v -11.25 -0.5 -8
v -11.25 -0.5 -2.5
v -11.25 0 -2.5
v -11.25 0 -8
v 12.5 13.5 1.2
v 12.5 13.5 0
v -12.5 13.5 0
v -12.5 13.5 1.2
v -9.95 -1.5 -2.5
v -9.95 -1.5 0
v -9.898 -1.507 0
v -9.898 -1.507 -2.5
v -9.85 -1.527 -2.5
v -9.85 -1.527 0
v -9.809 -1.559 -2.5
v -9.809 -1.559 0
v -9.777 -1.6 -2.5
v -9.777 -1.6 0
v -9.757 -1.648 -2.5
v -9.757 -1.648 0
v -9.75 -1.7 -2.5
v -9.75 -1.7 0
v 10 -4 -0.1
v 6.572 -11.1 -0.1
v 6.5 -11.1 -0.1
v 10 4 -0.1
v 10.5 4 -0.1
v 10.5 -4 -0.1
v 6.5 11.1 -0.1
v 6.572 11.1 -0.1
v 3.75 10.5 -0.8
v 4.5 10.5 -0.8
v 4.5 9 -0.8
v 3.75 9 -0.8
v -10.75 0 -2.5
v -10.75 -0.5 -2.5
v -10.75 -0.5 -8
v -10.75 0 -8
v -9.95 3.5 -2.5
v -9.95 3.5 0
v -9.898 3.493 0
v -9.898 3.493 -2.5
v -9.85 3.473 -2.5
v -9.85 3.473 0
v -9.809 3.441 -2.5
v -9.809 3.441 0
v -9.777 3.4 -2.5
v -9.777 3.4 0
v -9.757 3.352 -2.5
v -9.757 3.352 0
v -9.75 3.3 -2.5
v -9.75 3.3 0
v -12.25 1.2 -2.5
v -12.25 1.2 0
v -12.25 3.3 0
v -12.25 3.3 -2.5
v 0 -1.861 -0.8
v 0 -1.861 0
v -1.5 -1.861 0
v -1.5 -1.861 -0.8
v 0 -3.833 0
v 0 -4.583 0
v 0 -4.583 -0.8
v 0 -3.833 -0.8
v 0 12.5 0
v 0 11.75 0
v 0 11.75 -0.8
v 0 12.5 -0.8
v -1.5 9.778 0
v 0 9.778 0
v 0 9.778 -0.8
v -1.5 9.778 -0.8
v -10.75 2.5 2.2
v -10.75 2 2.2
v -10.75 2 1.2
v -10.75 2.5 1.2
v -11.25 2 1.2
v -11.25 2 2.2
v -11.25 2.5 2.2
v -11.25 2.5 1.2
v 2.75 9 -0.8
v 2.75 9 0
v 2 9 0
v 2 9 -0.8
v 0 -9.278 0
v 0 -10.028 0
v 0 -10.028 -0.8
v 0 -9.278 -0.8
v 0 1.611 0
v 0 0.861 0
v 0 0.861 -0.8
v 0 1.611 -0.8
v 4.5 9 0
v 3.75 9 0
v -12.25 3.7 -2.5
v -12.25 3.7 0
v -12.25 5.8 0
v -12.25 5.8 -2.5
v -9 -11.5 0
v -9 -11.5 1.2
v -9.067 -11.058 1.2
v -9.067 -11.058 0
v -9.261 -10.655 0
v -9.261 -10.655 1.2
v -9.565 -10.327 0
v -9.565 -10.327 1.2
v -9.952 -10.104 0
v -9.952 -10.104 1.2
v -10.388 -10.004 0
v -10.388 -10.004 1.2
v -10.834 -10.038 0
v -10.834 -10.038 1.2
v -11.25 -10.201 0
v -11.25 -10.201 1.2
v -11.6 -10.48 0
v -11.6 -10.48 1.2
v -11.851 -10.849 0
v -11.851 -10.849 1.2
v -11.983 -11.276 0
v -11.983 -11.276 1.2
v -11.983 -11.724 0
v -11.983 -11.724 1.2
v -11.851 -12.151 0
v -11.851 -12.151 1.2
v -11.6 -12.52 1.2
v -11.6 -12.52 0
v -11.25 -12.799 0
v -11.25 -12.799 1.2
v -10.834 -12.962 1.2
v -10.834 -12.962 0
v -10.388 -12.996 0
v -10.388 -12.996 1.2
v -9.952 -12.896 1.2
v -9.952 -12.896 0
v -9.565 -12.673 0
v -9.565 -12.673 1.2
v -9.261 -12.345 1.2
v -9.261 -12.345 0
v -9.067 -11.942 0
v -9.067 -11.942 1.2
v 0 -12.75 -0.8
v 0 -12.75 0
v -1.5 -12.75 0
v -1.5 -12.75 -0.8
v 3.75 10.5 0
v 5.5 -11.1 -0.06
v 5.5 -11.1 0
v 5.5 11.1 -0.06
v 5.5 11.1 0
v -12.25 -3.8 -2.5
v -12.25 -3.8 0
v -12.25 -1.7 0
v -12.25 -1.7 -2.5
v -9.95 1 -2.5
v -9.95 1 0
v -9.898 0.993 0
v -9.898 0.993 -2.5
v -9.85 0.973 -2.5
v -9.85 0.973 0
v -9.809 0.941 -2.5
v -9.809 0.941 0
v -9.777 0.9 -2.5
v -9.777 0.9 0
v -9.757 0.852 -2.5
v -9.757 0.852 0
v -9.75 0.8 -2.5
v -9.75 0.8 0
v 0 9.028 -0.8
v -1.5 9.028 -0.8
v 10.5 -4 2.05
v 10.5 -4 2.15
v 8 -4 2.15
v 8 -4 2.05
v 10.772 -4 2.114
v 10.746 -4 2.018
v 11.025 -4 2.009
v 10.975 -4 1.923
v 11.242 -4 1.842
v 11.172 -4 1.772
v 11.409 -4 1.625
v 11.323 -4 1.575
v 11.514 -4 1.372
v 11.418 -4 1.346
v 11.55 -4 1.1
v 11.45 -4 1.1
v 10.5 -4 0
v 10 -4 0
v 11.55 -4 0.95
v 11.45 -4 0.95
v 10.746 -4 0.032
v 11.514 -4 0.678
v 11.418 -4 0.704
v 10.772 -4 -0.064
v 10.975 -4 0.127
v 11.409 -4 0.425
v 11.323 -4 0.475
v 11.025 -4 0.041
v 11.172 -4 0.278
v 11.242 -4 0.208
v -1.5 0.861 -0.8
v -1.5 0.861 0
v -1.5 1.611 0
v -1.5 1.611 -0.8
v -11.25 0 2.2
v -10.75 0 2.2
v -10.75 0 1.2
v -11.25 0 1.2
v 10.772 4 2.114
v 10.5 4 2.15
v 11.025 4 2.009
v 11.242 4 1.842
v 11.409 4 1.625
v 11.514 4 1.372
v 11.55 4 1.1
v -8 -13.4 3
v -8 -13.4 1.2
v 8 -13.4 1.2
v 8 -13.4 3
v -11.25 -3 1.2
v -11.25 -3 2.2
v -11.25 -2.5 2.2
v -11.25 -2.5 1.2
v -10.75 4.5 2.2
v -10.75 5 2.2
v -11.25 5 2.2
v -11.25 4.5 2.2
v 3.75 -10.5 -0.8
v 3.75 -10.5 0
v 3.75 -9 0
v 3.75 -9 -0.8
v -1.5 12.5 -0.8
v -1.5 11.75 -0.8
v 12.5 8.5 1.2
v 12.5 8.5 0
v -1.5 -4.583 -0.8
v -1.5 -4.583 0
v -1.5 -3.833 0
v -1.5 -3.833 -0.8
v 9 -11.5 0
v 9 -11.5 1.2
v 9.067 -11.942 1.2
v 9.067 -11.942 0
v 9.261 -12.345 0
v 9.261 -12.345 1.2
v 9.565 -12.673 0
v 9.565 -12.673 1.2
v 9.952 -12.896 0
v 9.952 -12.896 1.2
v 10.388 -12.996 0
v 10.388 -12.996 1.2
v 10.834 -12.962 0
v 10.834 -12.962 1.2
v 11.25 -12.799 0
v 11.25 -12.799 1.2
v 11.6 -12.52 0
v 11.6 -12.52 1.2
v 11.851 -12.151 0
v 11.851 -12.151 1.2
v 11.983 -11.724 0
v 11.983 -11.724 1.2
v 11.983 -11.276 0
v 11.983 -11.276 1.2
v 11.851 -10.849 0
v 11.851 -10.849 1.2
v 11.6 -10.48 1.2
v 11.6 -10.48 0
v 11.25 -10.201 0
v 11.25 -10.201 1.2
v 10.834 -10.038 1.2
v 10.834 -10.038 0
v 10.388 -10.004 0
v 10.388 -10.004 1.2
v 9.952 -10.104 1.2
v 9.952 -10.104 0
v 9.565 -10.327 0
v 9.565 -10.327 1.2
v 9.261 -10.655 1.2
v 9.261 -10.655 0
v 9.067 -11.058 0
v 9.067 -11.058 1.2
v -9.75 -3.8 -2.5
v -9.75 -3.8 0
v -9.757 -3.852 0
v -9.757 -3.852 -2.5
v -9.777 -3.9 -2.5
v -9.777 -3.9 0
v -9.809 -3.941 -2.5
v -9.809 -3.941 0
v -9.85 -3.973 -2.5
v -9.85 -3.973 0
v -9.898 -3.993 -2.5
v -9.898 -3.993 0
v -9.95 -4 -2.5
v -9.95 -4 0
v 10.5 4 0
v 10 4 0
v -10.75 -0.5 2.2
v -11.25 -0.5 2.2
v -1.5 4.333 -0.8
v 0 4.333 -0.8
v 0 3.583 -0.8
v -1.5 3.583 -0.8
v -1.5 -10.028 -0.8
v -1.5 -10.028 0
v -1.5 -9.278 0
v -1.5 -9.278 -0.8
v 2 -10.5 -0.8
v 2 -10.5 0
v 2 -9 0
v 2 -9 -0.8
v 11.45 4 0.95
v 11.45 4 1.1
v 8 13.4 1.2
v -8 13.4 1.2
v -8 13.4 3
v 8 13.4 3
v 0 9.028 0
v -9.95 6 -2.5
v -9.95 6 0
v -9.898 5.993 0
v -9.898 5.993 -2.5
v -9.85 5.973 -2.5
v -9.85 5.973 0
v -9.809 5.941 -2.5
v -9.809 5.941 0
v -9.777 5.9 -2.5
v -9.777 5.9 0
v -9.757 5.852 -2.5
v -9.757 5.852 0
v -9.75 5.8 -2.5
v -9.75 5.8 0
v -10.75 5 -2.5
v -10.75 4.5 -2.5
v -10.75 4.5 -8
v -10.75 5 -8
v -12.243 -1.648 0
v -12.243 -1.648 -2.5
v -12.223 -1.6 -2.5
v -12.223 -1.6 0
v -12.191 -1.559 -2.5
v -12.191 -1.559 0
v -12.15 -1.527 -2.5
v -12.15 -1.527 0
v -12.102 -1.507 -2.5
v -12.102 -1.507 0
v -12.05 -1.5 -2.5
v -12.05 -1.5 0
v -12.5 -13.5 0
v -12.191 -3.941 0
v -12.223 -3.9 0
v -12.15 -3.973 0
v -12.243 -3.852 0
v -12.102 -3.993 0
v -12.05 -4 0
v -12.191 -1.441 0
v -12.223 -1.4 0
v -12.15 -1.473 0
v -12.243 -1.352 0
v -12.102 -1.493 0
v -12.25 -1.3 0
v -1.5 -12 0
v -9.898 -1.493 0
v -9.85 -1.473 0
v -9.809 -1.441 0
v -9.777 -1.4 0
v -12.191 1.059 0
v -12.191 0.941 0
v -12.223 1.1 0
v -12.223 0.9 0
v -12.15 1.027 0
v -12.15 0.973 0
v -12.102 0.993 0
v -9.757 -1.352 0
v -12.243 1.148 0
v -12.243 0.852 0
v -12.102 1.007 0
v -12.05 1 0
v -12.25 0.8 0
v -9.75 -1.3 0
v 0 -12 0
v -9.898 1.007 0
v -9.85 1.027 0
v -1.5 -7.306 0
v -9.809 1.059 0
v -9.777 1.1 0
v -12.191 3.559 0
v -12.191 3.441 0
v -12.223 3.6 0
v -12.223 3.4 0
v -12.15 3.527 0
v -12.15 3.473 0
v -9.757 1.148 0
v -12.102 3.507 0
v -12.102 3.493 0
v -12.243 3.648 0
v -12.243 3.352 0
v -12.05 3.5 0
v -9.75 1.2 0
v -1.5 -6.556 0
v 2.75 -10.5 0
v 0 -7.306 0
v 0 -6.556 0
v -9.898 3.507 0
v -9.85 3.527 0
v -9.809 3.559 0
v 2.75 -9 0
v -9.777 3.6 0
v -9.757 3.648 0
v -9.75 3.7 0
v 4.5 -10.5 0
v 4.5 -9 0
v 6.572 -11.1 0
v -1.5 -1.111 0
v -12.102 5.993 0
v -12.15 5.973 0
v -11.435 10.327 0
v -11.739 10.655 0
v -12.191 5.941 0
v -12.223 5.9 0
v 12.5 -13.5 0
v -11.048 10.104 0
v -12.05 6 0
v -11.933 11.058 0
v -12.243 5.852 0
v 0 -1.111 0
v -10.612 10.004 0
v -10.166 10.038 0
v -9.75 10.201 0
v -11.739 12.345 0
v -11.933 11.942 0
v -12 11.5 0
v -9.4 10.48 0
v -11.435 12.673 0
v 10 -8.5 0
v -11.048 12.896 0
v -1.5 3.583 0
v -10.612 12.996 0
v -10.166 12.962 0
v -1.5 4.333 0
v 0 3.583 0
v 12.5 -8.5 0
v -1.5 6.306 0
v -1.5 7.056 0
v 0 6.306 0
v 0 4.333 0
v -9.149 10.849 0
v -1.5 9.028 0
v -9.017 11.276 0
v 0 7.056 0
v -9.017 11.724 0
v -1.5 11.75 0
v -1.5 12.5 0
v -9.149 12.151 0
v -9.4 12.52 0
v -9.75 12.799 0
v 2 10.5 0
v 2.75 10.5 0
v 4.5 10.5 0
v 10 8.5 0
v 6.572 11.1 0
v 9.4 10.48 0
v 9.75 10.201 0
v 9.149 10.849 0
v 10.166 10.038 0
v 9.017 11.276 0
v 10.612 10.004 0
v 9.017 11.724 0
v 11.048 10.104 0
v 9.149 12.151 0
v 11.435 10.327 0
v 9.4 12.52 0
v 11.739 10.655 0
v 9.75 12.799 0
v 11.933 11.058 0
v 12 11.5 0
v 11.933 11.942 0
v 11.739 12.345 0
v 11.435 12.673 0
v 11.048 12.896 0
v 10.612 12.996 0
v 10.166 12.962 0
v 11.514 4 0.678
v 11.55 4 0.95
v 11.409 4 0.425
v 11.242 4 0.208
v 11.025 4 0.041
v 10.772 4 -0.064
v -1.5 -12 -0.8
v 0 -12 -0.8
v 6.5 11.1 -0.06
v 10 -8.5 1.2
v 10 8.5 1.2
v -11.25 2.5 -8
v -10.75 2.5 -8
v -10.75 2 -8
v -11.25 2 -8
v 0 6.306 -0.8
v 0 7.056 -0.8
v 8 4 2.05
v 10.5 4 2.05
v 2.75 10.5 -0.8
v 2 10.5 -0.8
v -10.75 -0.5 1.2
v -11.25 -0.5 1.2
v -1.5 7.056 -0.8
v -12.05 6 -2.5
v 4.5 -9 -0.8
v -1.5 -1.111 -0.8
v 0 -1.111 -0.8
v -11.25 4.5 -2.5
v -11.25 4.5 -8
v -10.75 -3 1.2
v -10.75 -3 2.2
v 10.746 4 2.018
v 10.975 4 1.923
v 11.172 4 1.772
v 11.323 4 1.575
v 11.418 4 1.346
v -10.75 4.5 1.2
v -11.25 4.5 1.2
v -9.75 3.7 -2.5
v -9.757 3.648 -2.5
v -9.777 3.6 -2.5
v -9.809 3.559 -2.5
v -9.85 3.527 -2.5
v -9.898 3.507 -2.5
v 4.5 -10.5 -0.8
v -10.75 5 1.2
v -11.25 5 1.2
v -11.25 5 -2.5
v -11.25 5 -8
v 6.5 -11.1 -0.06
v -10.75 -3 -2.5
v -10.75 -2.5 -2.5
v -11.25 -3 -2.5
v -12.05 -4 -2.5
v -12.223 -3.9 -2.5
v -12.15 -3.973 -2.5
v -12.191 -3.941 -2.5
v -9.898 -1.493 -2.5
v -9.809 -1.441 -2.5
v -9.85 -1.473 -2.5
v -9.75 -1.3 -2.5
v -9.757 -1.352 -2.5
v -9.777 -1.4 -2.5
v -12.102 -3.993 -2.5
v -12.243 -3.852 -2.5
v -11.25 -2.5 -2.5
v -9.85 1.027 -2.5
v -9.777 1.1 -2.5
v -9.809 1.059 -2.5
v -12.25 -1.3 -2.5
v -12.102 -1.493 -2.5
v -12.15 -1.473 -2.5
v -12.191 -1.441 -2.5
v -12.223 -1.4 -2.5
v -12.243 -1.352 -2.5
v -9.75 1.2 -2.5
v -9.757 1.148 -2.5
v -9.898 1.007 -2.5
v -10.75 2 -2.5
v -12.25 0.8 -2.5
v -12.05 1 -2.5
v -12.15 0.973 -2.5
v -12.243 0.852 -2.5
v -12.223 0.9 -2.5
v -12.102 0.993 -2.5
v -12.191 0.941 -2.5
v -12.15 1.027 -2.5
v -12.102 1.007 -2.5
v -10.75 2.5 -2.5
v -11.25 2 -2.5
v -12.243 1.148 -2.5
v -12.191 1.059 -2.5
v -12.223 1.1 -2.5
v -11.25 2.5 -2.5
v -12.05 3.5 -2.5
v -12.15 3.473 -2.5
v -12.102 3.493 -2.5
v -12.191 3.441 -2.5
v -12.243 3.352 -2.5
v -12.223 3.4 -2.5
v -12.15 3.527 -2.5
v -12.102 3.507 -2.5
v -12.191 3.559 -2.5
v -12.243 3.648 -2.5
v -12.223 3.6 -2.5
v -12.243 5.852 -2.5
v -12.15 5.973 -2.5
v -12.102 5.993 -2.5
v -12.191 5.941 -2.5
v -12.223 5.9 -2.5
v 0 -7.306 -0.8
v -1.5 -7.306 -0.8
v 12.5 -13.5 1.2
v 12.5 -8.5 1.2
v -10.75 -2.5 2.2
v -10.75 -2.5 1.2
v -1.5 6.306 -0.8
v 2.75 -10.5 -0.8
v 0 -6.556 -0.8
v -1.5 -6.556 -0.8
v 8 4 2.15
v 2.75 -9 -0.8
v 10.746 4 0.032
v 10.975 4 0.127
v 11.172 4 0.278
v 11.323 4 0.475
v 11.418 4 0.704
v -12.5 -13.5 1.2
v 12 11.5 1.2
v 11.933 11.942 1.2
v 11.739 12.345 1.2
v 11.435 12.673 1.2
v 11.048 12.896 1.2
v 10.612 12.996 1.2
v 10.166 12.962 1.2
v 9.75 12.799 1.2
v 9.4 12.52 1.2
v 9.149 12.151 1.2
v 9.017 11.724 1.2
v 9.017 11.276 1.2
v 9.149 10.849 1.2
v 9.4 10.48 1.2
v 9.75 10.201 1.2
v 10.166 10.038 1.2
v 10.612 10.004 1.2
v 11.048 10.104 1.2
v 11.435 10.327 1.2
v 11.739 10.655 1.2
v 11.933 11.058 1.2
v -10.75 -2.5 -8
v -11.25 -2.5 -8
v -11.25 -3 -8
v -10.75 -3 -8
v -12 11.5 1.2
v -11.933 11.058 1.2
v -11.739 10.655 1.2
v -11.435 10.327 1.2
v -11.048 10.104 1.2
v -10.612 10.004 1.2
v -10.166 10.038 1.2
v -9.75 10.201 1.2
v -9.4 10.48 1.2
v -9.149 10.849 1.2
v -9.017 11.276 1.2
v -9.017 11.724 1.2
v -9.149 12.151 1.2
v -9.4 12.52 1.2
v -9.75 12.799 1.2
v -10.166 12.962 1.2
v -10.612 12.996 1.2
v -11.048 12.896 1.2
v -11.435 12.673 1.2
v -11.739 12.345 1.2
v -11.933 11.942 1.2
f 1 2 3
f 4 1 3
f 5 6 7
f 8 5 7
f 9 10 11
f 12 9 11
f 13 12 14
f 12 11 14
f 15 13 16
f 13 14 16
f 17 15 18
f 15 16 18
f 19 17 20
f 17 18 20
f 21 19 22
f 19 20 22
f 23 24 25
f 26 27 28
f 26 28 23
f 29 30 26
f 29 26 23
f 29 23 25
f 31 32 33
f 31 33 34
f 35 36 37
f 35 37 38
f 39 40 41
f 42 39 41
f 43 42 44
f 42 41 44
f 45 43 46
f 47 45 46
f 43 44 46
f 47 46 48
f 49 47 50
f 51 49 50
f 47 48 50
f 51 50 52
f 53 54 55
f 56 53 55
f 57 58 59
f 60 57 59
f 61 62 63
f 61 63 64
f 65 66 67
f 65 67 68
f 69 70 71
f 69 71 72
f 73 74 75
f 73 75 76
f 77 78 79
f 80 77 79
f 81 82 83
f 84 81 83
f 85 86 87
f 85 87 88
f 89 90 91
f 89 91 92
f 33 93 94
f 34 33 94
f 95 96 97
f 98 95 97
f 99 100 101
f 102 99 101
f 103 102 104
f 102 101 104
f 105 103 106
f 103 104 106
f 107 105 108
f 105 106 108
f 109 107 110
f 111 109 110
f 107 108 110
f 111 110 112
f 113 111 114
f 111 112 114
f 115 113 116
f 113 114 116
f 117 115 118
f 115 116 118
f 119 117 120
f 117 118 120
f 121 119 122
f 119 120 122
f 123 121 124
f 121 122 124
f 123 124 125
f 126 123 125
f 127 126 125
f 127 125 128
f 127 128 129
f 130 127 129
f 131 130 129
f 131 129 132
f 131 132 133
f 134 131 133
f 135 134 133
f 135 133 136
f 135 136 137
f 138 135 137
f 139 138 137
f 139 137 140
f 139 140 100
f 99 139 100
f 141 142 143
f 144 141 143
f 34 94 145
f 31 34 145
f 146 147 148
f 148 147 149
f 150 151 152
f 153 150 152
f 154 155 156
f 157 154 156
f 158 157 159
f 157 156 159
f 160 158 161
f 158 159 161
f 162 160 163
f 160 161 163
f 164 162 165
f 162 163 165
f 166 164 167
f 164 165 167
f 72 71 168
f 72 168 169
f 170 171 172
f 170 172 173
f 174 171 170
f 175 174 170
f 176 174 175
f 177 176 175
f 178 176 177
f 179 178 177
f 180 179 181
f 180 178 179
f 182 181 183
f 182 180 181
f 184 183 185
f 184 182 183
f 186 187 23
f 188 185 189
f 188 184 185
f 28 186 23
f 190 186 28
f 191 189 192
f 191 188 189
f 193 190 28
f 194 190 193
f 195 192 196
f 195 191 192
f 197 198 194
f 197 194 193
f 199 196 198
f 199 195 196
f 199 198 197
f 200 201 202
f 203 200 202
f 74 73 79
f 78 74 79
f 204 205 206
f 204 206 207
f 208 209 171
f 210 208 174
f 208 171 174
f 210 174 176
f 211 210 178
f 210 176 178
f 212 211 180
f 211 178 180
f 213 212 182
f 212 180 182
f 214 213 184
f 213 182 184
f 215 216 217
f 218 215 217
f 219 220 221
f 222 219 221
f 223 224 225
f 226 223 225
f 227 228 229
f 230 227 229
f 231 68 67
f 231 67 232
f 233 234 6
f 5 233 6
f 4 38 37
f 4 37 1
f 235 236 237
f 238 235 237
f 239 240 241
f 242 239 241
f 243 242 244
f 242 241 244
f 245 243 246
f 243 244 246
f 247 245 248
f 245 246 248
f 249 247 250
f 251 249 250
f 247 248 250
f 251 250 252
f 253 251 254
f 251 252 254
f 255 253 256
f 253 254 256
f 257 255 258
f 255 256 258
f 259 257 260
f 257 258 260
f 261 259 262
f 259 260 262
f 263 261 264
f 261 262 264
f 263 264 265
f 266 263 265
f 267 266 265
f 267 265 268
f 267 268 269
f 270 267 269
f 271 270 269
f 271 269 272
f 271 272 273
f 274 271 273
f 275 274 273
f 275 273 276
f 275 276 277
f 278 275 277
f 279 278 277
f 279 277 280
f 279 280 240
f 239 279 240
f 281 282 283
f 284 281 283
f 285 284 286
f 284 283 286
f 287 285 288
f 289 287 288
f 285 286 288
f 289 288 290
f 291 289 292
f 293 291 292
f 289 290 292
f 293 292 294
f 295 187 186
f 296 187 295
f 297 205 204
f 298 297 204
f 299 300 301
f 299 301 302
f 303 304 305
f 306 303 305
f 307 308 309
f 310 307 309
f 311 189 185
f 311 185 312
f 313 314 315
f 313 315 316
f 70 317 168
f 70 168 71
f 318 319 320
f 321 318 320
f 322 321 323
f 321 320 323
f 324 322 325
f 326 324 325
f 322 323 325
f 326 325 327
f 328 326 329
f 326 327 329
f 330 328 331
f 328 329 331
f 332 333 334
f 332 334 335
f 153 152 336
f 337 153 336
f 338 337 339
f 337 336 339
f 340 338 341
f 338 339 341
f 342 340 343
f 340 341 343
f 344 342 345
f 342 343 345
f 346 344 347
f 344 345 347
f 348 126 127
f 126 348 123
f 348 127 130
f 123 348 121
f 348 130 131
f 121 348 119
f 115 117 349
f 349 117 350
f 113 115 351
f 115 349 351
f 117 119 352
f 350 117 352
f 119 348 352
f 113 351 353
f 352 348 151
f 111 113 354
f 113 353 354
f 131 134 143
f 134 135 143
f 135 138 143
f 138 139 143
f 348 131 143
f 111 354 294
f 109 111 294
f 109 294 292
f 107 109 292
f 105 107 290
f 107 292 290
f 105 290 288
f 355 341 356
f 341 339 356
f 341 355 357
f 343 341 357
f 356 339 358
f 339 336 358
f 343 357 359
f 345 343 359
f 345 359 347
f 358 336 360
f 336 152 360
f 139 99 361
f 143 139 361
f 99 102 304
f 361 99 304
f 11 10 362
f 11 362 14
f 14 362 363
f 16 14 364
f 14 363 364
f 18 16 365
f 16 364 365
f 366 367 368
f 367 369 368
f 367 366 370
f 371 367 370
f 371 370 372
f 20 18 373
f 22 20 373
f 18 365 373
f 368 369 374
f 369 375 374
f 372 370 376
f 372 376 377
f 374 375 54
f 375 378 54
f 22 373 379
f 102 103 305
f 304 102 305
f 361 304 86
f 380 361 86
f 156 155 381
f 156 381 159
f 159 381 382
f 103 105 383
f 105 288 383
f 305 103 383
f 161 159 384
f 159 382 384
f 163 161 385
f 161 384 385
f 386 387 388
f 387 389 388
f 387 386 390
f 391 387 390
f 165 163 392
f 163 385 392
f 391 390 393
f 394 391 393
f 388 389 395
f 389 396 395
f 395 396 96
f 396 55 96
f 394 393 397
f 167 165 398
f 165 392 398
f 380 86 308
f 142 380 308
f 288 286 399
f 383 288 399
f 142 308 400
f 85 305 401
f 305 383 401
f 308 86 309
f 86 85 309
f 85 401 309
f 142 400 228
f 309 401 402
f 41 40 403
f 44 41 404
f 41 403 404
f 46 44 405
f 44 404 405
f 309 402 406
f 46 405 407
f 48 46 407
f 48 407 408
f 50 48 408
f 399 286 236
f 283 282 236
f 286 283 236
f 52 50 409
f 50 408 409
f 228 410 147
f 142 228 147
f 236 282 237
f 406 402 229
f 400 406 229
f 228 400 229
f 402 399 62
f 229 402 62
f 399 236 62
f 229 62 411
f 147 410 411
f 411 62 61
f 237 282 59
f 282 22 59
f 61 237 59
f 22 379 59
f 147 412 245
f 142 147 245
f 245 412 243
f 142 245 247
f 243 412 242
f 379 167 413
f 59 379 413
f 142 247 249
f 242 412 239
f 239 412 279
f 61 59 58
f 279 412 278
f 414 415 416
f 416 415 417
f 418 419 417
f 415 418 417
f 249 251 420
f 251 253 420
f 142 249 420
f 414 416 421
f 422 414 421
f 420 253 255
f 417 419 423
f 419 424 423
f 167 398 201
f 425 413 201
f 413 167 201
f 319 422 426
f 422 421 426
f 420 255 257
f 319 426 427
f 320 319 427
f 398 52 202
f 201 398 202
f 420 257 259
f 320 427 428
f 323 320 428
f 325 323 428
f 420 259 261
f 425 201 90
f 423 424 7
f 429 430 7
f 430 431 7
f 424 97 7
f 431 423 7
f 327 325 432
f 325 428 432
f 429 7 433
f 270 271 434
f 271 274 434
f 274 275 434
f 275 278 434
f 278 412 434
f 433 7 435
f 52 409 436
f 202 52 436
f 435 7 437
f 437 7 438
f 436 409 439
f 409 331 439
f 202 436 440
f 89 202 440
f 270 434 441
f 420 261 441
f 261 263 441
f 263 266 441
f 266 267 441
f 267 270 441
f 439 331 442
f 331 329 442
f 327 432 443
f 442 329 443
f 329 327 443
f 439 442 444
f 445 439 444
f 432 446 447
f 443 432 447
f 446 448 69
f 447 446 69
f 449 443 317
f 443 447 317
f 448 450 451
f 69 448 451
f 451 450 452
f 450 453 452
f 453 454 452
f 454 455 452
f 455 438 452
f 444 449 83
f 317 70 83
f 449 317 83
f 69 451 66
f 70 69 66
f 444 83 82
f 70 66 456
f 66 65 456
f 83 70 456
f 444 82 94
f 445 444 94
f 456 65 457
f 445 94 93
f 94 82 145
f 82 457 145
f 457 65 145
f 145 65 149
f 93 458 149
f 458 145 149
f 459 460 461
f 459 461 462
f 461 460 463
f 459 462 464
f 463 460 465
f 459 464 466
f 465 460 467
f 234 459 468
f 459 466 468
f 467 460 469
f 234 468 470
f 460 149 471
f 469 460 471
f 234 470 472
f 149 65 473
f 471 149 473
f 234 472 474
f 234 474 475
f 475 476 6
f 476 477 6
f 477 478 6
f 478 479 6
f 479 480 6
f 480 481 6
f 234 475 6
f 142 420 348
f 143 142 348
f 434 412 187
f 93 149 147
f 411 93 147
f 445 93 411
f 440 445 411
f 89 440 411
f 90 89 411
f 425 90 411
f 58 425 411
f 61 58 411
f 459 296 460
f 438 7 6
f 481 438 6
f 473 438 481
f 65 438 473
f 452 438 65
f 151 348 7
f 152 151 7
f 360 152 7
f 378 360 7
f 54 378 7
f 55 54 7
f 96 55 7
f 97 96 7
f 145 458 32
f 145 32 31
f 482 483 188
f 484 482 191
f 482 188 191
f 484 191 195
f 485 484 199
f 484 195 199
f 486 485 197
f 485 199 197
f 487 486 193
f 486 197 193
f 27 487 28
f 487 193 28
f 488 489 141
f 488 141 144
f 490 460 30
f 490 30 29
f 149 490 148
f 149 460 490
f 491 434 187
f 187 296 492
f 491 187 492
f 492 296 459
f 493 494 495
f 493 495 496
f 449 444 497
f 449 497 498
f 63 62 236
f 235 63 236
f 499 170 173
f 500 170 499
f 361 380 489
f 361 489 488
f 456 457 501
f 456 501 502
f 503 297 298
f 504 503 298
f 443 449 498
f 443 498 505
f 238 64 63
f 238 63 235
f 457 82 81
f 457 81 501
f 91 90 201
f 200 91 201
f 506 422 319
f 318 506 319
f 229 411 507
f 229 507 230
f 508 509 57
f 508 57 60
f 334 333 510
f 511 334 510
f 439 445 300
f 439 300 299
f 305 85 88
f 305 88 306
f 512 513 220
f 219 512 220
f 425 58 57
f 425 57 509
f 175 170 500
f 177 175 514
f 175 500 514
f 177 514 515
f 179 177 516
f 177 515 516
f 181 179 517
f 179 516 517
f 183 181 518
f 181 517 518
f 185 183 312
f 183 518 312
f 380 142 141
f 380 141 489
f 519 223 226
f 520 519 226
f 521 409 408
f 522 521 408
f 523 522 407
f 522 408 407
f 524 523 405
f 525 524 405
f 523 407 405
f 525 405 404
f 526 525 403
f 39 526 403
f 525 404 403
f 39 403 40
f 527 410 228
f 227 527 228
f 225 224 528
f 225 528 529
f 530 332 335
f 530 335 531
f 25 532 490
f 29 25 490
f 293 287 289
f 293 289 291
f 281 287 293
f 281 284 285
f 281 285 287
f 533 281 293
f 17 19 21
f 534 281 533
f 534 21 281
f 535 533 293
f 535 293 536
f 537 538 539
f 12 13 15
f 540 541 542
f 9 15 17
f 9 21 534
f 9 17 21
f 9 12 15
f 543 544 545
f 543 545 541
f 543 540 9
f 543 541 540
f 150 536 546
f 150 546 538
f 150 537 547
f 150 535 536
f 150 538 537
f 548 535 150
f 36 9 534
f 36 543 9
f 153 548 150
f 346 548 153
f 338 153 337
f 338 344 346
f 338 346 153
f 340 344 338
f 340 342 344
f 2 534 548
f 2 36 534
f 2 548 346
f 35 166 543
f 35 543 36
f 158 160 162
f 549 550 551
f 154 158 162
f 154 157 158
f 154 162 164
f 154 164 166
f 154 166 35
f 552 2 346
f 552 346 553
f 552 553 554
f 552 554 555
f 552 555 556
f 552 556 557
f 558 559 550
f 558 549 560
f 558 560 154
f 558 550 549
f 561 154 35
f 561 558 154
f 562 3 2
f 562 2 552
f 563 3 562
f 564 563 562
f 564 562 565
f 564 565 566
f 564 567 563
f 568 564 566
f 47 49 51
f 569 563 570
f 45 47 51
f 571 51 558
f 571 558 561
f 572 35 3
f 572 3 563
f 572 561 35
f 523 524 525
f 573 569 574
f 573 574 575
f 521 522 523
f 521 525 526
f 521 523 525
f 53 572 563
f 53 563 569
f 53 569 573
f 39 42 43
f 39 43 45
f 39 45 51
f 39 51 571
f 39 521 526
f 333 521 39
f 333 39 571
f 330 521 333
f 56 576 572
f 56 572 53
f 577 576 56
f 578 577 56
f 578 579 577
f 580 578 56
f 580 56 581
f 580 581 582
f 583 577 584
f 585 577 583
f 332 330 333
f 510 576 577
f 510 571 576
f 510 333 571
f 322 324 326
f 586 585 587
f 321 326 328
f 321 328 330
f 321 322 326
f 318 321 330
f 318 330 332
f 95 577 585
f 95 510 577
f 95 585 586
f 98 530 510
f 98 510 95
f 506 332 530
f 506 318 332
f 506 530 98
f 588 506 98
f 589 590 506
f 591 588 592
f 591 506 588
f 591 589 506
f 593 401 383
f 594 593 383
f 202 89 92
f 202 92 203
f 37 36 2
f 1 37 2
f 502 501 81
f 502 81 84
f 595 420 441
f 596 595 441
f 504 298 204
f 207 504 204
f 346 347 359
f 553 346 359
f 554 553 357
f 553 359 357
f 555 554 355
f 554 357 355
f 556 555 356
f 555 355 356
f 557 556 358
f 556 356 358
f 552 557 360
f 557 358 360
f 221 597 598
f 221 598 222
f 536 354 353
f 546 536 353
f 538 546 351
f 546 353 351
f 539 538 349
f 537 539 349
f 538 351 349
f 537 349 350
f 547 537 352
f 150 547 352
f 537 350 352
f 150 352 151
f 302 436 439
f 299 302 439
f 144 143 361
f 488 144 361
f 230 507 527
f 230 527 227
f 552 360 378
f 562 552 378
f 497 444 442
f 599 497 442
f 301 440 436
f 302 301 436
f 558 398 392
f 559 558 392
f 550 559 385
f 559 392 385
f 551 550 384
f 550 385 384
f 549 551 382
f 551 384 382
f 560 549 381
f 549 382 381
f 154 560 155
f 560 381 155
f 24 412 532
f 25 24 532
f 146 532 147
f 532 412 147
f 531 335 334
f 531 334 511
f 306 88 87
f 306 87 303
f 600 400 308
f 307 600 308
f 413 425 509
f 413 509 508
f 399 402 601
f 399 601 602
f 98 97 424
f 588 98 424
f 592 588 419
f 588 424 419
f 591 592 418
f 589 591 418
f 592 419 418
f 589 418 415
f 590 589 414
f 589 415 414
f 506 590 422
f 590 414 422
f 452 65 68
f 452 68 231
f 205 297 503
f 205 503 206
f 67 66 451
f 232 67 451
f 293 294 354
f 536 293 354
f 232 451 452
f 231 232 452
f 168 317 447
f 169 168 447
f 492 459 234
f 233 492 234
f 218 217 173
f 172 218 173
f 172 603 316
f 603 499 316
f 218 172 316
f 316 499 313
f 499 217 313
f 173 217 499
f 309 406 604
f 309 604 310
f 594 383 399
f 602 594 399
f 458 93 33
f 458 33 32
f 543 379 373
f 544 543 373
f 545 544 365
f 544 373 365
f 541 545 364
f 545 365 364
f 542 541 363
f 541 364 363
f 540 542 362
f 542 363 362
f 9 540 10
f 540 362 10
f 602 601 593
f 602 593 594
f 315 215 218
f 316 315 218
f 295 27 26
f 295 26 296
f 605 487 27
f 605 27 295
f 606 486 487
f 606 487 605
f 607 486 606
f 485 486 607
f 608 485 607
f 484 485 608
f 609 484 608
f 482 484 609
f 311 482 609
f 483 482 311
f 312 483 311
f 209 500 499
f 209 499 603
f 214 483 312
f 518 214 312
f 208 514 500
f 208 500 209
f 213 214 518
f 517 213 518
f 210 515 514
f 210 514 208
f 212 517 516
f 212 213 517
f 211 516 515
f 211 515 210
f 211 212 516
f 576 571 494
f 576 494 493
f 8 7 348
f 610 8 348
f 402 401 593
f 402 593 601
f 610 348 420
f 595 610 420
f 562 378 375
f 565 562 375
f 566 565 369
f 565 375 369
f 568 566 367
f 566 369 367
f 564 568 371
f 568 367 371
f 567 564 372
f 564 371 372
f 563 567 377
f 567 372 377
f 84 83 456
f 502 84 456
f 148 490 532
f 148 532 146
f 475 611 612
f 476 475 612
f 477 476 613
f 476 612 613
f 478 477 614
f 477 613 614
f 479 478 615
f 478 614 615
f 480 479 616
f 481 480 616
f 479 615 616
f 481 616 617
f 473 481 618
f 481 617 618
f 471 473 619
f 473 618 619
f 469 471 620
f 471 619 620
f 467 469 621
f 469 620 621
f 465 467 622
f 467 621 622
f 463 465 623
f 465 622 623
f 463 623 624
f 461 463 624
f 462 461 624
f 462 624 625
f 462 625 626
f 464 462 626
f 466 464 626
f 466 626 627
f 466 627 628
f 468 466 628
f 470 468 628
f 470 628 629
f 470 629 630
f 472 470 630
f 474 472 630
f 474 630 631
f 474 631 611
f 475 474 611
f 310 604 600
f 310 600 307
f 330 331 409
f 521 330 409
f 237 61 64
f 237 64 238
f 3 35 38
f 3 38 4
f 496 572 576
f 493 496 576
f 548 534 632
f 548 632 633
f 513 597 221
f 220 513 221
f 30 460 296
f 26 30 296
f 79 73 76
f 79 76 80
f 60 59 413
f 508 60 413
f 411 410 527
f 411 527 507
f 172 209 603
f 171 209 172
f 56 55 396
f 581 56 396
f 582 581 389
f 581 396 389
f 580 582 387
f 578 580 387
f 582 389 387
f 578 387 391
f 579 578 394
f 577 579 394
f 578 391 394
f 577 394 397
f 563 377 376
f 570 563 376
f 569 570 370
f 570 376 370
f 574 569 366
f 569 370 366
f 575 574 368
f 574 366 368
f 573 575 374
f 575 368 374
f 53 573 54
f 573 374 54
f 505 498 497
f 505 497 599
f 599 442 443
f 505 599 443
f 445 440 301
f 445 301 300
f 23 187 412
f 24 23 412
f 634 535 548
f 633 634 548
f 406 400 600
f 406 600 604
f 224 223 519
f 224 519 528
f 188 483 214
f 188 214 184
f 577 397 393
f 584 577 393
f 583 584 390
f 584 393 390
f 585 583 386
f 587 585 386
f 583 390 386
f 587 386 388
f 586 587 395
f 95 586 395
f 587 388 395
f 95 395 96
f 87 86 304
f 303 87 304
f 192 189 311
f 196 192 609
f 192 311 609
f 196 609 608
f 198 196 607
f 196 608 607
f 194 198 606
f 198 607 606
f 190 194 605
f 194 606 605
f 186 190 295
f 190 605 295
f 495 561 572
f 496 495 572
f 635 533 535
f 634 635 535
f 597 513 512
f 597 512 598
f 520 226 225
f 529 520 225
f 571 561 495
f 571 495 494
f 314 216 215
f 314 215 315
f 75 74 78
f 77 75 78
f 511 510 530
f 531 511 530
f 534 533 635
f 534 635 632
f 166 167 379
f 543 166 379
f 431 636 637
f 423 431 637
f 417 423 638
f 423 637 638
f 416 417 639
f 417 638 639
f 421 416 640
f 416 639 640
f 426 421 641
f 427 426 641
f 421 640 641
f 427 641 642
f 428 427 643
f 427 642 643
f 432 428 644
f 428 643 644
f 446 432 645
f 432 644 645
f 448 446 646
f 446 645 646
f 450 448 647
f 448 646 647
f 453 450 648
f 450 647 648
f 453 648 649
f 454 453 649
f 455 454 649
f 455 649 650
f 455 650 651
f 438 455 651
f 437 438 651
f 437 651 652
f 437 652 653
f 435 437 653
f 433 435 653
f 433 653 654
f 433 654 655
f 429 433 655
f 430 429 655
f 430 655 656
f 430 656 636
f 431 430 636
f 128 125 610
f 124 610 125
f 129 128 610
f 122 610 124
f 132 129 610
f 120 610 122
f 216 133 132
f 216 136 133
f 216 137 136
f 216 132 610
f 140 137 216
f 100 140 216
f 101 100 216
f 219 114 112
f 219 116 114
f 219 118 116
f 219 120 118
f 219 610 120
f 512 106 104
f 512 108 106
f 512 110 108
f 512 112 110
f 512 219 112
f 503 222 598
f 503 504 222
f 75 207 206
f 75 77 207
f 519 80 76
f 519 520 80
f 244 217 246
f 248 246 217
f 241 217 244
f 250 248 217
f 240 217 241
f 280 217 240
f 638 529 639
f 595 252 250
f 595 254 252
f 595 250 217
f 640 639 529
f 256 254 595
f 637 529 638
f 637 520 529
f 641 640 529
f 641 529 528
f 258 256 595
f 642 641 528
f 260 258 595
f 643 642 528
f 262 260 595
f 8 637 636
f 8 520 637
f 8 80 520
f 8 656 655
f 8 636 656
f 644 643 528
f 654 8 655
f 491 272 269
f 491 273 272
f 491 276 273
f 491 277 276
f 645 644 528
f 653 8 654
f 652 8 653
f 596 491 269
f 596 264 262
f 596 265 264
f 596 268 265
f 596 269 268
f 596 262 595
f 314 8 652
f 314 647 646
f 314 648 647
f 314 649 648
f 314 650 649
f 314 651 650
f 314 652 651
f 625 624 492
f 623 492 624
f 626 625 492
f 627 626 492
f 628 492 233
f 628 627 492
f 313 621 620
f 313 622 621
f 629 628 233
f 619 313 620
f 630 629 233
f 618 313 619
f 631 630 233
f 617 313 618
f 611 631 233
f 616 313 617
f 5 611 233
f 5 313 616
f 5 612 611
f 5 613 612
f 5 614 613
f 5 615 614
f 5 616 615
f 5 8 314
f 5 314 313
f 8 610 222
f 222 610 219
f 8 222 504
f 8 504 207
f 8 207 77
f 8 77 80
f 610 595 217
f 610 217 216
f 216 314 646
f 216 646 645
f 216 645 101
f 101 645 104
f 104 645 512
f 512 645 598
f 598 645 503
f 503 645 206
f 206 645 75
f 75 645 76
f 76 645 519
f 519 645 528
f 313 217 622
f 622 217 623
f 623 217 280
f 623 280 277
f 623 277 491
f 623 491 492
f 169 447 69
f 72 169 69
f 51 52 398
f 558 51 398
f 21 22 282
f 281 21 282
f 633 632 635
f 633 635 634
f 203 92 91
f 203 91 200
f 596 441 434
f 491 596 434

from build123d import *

# Parameters (mm, degrees)
BOSS_EXTRUDE1_DEPTH      = 1.2
SKETCH2_R                = 1.5
CUT_EXTRUDE1_DEPTH       = 19.437461864
BOSS_EXTRUDE2_DEPTH      = 2.5
BOSS_EXTRUDE3_DEPTH      = 5.5
BOSS_EXTRUDE3_DEPTH_BACK = 4.7
SKETCH6_W                = 0.5
SKETCH6_H                = 0.5
SKETCH7_W                = 16
SKETCH7_H                = 26.8
BOSS_EXTRUDE4_DEPTH      = 1.8
SKETCH8_W                = 1.5
SKETCH8_H                = 0.75
SKETCH8_W_2              = 0.75
SKETCH8_H_2              = 1.5
BOSS_EXTRUDE5_DEPTH      = 0.8
SKETCH10_W               = 0.1
SKETCH10_H               = 8
BOSS_EXTRUDE6_DEPTH      = 0.1
SKETCH12_W               = 1
SKETCH12_H               = 22.2
BOSS_EXTRUDE7_DEPTH      = 0.06


with BuildPart() as part:
    # Sketch1 → Boss-Extrude1 (new body)
    with BuildSketch(Plane.XY):
        Polygon((10, -8.5), (10, 8.5), (12.5, 8.5), (12.5, 13.5), (-12.5, 13.5), (-12.5, -13.5), (12.5, -13.5), (12.5, -8.5), align=None)
    extrude(amount=BOSS_EXTRUDE1_DEPTH)

    # Sketch2 → Cut-Extrude1 (cut, through all)
    with BuildSketch(Plane.XY.offset(1.2)):
        with Locations((10.5, 11.5)):
            Circle(SKETCH2_R)
        with Locations(Location((10.5, -11.5, 0), (0, 0, 180))):
            Circle(SKETCH2_R)
        with Locations(Location((-10.5, 11.5, 0), (0, 0, 180))):
            Circle(SKETCH2_R)
        with Locations((-10.5, -11.5)):
            Circle(SKETCH2_R)
    extrude(amount=-CUT_EXTRUDE1_DEPTH, mode=Mode.SUBTRACT)

    # Sketch5 → Boss-Extrude2 (add)
    with BuildSketch(Plane(origin=(0, 0, 0), x_dir=(-1, 0, 0), z_dir=(0, 0, -1))):
        with BuildLine():
            Line((12.05, 6), (9.95, 6))
            ThreePointArc((9.95, 6), (9.808578644, 5.941421356), (9.75, 5.8))
            Line((9.75, 5.8), (9.75, 3.7))
            ThreePointArc((9.75, 3.7), (9.808578644, 3.558578644), (9.95, 3.5))
            ThreePointArc((9.95, 3.5), (9.808578644, 3.441421356), (9.75, 3.3))
            Line((9.75, 3.3), (9.75, 1.2))
            ThreePointArc((9.75, 1.2), (9.808578644, 1.058578644), (9.95, 1))
            ThreePointArc((9.95, 1), (9.808578644, 0.941421356), (9.75, 0.8))
            Line((9.75, 0.8), (9.75, -1.3))
            ThreePointArc((9.75, -1.3), (9.808578644, -1.441421356), (9.95, -1.5))
            ThreePointArc((9.95, -1.5), (9.808578644, -1.558578644), (9.75, -1.7))
            Line((9.75, -1.7), (9.75, -3.8))
            ThreePointArc((9.75, -3.8), (9.808578644, -3.941421356), (9.95, -4))
            Line((9.95, -4), (12.05, -4))
            ThreePointArc((12.05, -4), (12.191421356, -3.941421356), (12.25, -3.8))
            Line((12.25, -3.8), (12.25, -1.7))
            ThreePointArc((12.25, -1.7), (12.191421356, -1.558578644), (12.05, -1.5))
            ThreePointArc((12.05, -1.5), (12.191421356, -1.441421356), (12.25, -1.3))
            Line((12.25, -1.3), (12.25, 0.8))
            ThreePointArc((12.25, 0.8), (12.191421356, 0.941421356), (12.05, 1))
            ThreePointArc((12.05, 1), (12.191421356, 1.058578644), (12.25, 1.2))
            Line((12.25, 1.2), (12.25, 3.3))
            ThreePointArc((12.25, 3.3), (12.191421356, 3.441421356), (12.05, 3.5))
            ThreePointArc((12.05, 3.5), (12.191421356, 3.558578644), (12.25, 3.7))
            Line((12.25, 3.7), (12.25, 5.8))
            ThreePointArc((12.25, 5.8), (12.191421356, 5.941421356), (12.05, 6))
        make_face()
    extrude(amount=BOSS_EXTRUDE2_DEPTH)

    # Sketch6 → Boss-Extrude3 (add, two sides: drawn at the far end of the back side and taken through both)
    with BuildSketch(Plane(origin=(0, 0, -2.5), x_dir=(-1, 0, 0), z_dir=(0, 0, -1)).offset(-BOSS_EXTRUDE3_DEPTH_BACK)):
        with Locations((11, 4.75)):
            Rectangle(SKETCH6_W, SKETCH6_H)
        with Locations((11, 2.25)):
            Rectangle(SKETCH6_W, SKETCH6_H)
        with Locations((11, -0.25)):
            Rectangle(SKETCH6_W, SKETCH6_H)
        with Locations((11, -2.75)):
            Rectangle(SKETCH6_W, SKETCH6_H)
    extrude(amount=BOSS_EXTRUDE3_DEPTH + BOSS_EXTRUDE3_DEPTH_BACK)

    # Sketch7 → Boss-Extrude4 (add)
    with BuildSketch(Plane.XY.offset(1.2)):
        Rectangle(SKETCH7_W, SKETCH7_H)
    extrude(amount=BOSS_EXTRUDE4_DEPTH)

    # Sketch8 → Boss-Extrude5 (add)
    with BuildSketch(Plane(origin=(0, 0, 0), x_dir=(-1, 0, 0), z_dir=(0, 0, -1))):
        with Locations((0.75, 12.125)):
            Rectangle(SKETCH8_W, SKETCH8_H)
        with Locations((0.75, 9.402777778)):
            Rectangle(SKETCH8_W, SKETCH8_H)
        with Locations((0.75, 6.680555556)):
            Rectangle(SKETCH8_W, SKETCH8_H)
        with Locations((0.75, 3.958333333)):
            Rectangle(SKETCH8_W, SKETCH8_H)
        with Locations((0.75, 1.236111111)):
            Rectangle(SKETCH8_W, SKETCH8_H)
        with Locations((0.75, -1.486111111)):
            Rectangle(SKETCH8_W, SKETCH8_H)
        with Locations((0.75, -4.208333333)):
            Rectangle(SKETCH8_W, SKETCH8_H)
        with Locations((0.75, -6.930555556)):
            Rectangle(SKETCH8_W, SKETCH8_H)
        with Locations((0.75, -9.652777778)):
            Rectangle(SKETCH8_W, SKETCH8_H)
        with Locations((0.75, -12.375)):
            Rectangle(SKETCH8_W, SKETCH8_H)
        with Locations((-2.375, -9.75)):
            Rectangle(SKETCH8_W_2, SKETCH8_H_2)
        with Locations((-4.125, -9.75)):
            Rectangle(SKETCH8_W_2, SKETCH8_H_2)
        with Locations((-2.375, 9.75)):
            Rectangle(SKETCH8_W_2, SKETCH8_H_2)
        with Locations((-4.125, 9.75)):
            Rectangle(SKETCH8_W_2, SKETCH8_H_2)
    extrude(amount=BOSS_EXTRUDE5_DEPTH)

    # Sweep1: sweep along a path in Sketch9
    with BuildLine(Plane(origin=(0, 13.5, 0), x_dir=(1, 0, 0), z_dir=(0, 1, 0))) as sweep1_path:
        Line((8, -2.1), (10.5, -2.1))
        ThreePointArc((10.5, -2.1), (11.207106781, -1.807106781), (11.5, -1.1))
        Line((11.5, -1.1), (11.5, -0.95))
        ThreePointArc((11.5, -0.95), (11.207106781, -0.242893219), (10.5, 0.05))
        Line((10.5, 0.05), (9, 0.05))
    # Sketch10 → Sweep1 (sweep)
    with BuildSketch(Plane(origin=(8, 0, 0), x_dir=(0, 0, -1), z_dir=(1, 0, 0))):
        with Locations((-2.1, 0)):
            Rectangle(SKETCH10_W, SKETCH10_H)
    sweep(path=sweep1_path.line)

    # Sketch11 → Boss-Extrude6 (add)
    with BuildSketch(Plane(origin=(0, 0, 0), x_dir=(-1, 0, 0), z_dir=(0, 0, -1))):
        Polygon((-6.5, -11.1), (-6.5, 11.1), (-6.572413793, 11.1), (-10, 4), (-9, 4), (-9, -4), (-10, -4), (-6.572413793, -11.1), align=None)
    extrude(amount=BOSS_EXTRUDE6_DEPTH)

    # Sketch12 → Boss-Extrude7 (add)
    with BuildSketch(Plane(origin=(0, 0, 0), x_dir=(-1, 0, 0), z_dir=(0, 0, -1))):
        with Locations((-6, 0)):
            Rectangle(SKETCH12_W, SKETCH12_H)
    extrude(amount=BOSS_EXTRUDE7_DEPTH)


solid = part.part
